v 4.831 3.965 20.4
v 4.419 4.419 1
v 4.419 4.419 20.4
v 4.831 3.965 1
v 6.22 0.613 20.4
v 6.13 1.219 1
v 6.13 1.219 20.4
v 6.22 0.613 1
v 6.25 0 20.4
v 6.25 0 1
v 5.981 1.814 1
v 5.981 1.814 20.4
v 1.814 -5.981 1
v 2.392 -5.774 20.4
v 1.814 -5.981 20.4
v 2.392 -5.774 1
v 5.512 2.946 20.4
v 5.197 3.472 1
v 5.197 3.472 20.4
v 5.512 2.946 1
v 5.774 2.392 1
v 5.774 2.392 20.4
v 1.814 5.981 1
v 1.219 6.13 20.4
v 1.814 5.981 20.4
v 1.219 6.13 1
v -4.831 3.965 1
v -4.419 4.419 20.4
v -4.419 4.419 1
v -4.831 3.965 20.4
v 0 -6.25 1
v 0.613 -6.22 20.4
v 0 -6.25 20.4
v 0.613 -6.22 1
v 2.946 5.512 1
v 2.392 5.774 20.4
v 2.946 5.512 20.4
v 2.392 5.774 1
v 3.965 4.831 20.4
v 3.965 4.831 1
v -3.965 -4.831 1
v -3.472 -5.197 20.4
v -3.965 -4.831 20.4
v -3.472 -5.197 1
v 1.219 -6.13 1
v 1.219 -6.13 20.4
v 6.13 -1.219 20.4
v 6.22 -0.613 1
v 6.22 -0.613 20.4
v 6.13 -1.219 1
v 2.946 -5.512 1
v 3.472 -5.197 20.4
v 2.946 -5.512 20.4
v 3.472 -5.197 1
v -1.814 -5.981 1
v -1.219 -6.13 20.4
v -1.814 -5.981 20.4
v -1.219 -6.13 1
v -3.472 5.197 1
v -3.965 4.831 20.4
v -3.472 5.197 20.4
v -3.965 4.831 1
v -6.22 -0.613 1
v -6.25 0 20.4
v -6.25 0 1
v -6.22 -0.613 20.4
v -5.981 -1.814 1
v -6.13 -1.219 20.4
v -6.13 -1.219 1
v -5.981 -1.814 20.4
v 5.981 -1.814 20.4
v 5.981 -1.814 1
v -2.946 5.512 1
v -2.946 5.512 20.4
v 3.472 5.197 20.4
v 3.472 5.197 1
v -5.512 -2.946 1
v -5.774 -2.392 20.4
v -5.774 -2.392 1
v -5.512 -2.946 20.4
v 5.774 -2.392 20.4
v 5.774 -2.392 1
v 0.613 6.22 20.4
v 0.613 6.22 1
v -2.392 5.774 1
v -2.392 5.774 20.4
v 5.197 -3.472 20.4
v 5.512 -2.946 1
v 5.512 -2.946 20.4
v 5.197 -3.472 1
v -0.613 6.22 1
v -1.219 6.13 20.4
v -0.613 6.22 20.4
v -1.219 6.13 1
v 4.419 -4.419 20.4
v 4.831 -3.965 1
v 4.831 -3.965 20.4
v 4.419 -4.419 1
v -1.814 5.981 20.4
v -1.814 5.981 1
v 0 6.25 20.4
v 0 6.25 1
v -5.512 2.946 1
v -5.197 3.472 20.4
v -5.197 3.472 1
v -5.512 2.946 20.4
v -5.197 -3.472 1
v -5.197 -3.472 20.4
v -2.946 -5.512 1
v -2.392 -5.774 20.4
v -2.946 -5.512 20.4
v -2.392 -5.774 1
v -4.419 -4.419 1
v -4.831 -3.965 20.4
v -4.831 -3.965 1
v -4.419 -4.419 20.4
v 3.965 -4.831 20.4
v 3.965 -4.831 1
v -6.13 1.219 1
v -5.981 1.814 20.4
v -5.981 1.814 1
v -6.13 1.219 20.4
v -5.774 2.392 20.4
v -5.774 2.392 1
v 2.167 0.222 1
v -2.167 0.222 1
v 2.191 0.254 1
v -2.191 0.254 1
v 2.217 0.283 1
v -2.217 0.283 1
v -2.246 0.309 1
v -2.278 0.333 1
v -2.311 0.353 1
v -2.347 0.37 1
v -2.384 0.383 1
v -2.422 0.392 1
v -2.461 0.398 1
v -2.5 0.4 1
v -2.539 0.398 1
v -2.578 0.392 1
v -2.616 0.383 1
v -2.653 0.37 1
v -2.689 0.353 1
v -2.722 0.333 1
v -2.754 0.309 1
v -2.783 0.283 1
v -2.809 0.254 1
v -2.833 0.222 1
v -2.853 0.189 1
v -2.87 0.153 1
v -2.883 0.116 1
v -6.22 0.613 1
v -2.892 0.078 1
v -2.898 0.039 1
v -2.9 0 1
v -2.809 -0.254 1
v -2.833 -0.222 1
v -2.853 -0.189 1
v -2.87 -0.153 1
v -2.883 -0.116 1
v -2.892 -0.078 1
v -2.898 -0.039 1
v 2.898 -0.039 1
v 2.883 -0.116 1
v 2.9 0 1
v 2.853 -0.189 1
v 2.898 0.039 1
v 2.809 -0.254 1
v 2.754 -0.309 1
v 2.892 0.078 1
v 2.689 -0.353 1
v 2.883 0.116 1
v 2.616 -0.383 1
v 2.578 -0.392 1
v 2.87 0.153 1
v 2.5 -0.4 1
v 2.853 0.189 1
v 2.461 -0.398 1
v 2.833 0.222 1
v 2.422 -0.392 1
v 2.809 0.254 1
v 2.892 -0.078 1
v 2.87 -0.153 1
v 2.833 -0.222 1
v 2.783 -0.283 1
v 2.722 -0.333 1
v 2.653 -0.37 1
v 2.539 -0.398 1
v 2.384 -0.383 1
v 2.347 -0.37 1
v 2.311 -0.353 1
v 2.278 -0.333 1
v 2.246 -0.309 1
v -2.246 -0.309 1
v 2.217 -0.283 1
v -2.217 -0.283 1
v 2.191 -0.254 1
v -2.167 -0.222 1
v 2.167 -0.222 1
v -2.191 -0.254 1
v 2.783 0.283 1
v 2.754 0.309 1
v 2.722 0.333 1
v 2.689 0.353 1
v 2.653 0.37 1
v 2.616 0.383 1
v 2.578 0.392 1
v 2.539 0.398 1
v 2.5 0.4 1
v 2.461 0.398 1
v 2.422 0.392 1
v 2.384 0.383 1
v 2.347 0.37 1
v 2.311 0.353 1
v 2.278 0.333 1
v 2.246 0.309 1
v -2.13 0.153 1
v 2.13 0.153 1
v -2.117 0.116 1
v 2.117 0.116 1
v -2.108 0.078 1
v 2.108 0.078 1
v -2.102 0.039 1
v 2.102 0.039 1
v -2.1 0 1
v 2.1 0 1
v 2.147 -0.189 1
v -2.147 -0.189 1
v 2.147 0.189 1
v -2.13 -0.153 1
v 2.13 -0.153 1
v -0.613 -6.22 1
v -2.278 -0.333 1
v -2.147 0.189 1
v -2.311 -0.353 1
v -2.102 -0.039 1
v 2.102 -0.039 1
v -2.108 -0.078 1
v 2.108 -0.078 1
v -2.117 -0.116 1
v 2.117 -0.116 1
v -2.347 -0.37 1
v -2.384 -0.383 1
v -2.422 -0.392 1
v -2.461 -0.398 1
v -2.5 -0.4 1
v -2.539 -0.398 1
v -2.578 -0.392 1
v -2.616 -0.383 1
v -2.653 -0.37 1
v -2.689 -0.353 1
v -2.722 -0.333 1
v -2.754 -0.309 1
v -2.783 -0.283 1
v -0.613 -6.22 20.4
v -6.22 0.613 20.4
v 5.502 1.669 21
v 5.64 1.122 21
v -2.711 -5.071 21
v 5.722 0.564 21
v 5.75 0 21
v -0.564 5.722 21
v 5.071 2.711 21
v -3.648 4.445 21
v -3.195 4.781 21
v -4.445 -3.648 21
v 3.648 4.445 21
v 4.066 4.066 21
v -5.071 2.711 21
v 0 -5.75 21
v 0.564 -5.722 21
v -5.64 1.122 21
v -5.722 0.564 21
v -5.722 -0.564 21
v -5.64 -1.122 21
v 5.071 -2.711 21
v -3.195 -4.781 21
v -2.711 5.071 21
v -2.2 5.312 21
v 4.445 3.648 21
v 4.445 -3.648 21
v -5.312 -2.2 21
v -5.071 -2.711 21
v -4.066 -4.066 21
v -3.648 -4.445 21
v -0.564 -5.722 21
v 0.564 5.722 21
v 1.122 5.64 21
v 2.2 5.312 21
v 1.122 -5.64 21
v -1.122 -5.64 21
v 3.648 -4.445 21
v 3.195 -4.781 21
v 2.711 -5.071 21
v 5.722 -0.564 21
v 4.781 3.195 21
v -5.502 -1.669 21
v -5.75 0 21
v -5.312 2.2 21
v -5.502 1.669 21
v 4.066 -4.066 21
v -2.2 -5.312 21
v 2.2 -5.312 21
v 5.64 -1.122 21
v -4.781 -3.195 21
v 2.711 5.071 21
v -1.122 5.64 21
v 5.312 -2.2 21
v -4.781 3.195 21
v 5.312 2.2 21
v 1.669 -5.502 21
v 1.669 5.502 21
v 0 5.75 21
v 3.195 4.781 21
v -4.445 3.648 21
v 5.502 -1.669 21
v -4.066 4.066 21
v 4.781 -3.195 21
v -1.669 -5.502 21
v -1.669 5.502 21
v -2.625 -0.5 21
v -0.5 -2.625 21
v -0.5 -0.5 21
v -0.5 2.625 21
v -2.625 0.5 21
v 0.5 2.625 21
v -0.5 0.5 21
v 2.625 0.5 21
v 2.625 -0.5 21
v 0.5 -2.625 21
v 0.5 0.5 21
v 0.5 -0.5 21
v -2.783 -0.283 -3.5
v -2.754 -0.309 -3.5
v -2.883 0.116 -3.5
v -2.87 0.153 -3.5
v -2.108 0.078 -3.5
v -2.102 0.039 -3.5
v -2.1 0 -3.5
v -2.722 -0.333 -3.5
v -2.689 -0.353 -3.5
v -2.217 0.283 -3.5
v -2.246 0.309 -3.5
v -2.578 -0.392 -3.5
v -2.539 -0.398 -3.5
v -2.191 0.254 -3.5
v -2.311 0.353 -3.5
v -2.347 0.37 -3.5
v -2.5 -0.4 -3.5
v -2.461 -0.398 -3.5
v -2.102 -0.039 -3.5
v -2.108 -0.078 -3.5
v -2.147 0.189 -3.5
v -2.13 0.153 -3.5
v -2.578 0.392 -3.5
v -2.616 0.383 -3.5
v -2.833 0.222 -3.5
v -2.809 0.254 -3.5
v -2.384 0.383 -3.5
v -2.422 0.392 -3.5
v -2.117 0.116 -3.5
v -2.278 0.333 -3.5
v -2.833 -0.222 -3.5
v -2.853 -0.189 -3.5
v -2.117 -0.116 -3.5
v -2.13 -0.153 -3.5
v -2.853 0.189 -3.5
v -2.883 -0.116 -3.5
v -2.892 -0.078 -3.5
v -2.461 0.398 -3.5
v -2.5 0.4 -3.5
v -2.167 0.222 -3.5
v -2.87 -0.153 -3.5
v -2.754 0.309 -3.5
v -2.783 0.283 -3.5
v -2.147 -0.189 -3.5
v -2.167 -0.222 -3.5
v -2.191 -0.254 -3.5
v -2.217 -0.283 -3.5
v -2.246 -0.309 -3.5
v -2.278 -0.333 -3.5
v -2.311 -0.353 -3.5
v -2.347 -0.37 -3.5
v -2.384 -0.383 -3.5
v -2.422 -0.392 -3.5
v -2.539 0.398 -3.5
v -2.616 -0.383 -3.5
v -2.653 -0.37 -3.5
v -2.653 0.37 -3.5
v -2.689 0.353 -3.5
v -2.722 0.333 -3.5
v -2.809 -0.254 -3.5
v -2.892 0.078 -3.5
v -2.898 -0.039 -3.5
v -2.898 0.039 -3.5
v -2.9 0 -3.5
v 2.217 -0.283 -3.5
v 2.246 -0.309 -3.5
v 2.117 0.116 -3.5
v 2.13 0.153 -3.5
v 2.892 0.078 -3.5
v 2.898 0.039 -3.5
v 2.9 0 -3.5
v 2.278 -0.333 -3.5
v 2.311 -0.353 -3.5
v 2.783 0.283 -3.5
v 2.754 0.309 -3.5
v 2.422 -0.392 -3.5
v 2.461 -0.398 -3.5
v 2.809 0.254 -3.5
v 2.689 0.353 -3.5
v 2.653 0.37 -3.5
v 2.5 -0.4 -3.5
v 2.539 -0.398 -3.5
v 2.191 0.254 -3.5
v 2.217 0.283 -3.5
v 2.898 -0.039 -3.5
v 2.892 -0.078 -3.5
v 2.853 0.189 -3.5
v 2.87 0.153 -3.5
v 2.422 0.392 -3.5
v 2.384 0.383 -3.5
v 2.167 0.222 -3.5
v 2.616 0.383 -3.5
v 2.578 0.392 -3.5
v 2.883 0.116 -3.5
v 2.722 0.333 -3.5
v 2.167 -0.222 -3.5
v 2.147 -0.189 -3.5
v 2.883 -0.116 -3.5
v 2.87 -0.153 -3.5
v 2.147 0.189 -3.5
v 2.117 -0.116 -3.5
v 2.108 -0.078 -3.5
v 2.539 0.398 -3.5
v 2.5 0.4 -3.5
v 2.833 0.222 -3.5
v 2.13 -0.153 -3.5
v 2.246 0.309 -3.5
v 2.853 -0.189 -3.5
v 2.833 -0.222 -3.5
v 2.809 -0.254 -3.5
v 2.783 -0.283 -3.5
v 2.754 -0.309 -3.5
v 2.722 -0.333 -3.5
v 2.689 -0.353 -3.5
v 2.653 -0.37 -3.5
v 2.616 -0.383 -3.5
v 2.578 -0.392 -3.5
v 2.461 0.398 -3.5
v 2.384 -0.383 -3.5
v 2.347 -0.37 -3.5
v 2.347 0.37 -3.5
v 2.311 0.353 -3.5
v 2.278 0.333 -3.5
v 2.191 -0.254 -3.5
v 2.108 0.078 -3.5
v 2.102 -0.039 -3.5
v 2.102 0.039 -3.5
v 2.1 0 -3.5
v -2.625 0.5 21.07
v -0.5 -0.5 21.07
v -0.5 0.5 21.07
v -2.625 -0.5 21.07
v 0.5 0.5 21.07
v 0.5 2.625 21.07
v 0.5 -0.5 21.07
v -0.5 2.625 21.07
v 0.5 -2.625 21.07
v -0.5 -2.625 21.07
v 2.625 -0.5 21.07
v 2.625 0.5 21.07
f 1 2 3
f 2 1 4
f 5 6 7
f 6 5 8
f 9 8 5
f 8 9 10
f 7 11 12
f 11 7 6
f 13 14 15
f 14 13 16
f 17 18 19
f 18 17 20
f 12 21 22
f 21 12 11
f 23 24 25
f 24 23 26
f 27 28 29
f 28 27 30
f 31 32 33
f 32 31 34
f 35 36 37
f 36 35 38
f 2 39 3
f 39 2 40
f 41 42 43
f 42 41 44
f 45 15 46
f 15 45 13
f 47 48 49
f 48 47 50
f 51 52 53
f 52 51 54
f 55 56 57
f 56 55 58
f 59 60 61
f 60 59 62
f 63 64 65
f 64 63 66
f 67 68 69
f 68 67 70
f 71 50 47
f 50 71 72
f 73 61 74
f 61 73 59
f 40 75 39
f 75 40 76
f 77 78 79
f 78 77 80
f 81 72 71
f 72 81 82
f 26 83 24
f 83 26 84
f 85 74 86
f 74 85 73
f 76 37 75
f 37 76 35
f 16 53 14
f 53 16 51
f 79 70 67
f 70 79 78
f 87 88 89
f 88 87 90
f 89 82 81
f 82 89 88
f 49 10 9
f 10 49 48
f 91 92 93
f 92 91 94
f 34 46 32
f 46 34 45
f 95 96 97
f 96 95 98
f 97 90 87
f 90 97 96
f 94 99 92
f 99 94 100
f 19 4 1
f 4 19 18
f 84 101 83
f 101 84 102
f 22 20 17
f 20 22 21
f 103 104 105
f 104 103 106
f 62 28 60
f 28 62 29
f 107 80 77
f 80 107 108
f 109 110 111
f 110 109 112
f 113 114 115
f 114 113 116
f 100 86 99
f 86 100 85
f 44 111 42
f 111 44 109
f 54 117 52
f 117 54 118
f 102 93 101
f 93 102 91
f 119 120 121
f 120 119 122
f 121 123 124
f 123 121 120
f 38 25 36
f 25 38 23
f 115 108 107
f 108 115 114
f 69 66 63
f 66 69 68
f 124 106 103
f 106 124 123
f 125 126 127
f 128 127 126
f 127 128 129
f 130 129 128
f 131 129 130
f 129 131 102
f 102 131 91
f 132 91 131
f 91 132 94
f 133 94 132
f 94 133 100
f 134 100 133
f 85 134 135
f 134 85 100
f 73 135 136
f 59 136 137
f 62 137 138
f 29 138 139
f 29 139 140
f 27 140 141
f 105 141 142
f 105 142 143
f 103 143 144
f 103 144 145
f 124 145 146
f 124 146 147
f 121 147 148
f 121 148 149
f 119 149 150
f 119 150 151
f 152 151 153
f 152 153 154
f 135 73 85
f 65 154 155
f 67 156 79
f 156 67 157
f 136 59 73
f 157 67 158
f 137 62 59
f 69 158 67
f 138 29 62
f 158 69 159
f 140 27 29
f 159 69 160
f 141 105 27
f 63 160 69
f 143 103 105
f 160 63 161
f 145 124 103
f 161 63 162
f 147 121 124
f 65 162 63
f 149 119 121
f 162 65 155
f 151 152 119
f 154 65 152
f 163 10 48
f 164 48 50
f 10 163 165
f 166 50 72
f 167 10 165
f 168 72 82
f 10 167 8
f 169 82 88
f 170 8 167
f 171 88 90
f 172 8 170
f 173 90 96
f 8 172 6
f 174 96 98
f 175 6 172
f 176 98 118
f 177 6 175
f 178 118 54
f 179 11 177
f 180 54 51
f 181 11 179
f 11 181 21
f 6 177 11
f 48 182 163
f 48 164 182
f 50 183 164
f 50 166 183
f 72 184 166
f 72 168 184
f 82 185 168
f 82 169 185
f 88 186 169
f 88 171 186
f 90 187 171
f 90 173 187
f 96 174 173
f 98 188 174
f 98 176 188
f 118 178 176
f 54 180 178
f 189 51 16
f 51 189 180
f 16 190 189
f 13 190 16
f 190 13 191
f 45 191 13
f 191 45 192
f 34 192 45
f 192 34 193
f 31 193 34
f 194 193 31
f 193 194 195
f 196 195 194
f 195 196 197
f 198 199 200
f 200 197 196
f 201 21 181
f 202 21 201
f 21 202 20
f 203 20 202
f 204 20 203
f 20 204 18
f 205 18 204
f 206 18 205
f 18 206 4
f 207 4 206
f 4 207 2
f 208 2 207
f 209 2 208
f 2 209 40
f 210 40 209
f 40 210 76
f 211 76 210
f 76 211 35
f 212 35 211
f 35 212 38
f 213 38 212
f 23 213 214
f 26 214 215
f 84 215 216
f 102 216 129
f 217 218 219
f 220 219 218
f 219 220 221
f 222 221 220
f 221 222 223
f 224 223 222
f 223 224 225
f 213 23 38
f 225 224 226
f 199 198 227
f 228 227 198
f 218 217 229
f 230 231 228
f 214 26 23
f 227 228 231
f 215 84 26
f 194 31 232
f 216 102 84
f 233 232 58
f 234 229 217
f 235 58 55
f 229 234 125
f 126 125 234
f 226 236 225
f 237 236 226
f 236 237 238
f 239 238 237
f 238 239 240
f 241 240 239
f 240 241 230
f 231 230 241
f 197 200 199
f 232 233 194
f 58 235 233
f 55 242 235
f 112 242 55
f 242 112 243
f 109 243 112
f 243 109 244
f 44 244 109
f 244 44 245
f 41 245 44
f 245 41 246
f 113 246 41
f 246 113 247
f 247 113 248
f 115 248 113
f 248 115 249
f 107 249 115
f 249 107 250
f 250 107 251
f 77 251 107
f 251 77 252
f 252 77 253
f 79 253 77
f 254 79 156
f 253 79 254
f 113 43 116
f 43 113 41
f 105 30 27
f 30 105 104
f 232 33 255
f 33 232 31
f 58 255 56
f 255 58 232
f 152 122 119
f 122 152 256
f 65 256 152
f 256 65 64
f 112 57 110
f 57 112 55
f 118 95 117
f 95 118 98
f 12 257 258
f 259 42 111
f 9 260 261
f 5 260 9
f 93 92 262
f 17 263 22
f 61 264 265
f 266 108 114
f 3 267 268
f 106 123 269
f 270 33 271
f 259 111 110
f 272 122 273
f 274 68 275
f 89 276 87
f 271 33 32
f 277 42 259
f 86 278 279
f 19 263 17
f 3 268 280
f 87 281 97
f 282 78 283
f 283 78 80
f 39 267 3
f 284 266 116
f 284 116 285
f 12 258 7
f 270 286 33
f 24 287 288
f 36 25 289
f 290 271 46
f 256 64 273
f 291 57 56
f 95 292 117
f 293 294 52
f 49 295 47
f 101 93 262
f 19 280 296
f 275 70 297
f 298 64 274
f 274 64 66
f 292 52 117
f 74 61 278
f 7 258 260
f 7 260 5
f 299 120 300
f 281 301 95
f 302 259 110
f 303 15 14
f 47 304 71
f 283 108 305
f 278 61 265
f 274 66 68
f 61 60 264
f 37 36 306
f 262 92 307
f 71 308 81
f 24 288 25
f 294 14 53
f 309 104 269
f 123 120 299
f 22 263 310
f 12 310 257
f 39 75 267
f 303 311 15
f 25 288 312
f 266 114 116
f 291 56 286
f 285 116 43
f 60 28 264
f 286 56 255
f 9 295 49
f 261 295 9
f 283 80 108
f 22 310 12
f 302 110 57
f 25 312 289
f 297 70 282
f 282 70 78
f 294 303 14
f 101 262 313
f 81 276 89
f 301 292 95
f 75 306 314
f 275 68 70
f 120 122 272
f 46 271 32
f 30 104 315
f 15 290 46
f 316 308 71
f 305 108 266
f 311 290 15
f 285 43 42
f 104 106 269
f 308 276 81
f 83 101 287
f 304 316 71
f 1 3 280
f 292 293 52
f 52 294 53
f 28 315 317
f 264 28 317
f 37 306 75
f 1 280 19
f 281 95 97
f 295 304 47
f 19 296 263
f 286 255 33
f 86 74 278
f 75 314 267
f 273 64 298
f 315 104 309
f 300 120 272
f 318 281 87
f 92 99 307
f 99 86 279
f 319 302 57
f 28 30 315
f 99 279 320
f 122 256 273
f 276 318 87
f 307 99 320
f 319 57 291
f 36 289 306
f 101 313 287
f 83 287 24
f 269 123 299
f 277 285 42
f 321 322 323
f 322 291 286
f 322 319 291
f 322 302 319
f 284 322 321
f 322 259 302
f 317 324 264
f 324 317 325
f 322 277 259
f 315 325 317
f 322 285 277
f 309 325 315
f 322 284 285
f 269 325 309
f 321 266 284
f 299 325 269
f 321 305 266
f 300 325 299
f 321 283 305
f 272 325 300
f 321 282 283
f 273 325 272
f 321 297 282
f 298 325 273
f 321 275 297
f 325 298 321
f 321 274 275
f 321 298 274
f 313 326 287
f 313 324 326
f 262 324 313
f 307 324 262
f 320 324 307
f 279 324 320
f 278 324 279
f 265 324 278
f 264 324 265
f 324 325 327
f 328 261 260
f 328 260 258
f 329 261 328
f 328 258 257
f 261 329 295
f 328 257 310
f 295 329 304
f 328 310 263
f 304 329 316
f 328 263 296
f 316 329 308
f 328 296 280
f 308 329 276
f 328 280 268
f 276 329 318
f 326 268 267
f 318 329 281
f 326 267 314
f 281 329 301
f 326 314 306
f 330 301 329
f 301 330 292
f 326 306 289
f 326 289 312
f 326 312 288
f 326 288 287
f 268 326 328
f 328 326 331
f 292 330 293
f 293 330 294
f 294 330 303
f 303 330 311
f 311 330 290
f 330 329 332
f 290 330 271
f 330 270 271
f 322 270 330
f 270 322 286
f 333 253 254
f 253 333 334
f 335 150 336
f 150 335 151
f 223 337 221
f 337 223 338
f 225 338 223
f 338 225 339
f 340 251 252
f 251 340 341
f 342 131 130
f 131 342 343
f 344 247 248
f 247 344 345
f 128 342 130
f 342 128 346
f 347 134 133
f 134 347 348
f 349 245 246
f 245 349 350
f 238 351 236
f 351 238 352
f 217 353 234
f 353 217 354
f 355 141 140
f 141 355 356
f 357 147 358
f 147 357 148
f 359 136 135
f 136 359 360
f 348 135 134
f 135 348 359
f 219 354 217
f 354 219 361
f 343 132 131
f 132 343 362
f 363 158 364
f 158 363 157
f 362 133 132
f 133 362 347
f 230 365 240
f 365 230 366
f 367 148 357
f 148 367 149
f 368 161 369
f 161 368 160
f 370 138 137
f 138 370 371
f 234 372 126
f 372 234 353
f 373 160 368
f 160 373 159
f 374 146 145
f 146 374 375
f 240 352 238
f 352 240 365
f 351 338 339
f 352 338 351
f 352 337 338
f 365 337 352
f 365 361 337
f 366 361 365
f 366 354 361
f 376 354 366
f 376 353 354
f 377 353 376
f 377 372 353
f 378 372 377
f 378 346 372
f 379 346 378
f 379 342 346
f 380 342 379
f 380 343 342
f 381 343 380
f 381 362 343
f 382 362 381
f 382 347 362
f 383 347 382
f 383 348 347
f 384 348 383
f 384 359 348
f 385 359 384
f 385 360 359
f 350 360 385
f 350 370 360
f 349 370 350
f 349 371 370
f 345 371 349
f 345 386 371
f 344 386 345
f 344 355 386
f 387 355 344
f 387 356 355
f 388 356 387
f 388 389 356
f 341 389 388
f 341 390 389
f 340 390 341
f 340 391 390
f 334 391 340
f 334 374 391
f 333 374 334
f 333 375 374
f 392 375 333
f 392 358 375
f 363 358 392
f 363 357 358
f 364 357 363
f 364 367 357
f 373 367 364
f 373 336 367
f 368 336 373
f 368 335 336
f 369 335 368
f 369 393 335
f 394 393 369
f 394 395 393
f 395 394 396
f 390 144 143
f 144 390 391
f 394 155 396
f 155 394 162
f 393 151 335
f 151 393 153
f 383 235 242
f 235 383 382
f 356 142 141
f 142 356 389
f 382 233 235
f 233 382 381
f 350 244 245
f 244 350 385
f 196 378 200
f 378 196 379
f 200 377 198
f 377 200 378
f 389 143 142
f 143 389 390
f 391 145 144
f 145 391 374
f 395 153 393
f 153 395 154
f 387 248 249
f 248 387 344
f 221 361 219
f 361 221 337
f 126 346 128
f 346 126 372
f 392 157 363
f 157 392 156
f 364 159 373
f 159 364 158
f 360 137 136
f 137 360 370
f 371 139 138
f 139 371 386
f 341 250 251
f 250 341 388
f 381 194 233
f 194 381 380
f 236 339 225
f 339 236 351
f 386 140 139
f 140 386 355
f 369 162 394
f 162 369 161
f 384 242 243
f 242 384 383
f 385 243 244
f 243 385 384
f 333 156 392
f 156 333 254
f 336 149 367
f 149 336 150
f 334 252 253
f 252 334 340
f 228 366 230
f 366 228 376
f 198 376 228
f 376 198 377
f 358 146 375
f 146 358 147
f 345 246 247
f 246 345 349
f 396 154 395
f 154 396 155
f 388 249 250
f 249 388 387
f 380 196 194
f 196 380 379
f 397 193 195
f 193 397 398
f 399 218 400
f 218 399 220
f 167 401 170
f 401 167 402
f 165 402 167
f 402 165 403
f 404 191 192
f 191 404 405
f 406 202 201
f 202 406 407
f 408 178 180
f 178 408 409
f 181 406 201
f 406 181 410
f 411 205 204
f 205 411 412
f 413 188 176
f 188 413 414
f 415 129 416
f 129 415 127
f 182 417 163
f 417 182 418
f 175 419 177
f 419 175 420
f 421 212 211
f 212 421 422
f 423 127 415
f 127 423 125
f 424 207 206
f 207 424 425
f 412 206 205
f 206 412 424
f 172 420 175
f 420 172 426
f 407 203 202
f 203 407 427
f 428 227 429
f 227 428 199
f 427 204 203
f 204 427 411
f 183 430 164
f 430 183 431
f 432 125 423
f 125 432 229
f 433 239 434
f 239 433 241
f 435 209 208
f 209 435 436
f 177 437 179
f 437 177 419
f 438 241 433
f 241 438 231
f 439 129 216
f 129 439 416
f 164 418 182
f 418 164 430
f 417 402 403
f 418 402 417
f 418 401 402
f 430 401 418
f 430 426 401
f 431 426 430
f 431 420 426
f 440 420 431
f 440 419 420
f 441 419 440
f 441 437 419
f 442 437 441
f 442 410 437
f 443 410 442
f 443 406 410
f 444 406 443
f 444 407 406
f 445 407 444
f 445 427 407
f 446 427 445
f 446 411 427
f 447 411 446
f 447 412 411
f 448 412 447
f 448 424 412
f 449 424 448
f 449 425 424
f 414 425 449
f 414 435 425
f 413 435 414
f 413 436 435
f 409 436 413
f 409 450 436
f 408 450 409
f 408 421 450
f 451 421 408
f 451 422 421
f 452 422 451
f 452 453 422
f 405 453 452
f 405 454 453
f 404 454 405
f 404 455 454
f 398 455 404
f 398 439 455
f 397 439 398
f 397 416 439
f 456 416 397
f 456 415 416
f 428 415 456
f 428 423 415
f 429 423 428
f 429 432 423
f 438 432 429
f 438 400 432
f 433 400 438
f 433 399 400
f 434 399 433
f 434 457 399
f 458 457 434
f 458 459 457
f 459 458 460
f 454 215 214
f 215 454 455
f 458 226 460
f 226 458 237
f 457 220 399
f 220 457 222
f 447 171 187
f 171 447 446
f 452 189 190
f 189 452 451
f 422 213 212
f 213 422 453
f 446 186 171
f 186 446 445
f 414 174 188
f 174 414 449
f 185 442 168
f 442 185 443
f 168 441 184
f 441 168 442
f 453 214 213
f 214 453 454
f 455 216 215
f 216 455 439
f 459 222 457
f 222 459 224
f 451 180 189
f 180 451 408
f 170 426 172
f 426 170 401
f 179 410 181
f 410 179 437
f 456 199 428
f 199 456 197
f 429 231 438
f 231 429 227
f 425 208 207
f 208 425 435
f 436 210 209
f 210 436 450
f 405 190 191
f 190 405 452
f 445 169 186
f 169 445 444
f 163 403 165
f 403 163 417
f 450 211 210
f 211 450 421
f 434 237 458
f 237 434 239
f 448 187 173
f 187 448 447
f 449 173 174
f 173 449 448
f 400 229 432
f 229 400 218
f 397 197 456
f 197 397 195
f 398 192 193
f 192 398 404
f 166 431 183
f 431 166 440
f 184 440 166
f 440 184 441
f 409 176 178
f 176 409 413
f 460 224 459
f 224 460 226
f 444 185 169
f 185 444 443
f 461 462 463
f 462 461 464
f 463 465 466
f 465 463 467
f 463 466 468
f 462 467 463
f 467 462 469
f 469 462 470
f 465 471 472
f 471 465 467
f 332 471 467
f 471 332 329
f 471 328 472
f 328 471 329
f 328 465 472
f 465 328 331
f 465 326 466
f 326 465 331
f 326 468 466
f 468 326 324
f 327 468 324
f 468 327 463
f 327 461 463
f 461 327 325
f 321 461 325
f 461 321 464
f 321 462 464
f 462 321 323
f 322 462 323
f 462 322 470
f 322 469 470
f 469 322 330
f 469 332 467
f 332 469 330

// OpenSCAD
$fn = 64;

body_diameter = 12.5;
body_height = 20;
lead_spacing = 5;
lead_diameter = 0.8;
lead_length_below = 3.5;
body_lift = 1;
lead_stub = 1;
top_chamfer = 0.6;

module lead(x) {
    color([0.75, 0.75, 0.75])
    translate([x, 0, -lead_length_below])
        cylinder(h = lead_length_below + body_lift + lead_stub, d = lead_diameter);
}

module capacitor_body() {
    color([0.16, 0.18, 0.19])
    union() {
        translate([0, 0, body_lift])
            cylinder(h = body_height - top_chamfer, d = body_diameter);
        translate([0, 0, body_lift + body_height - top_chamfer])
            cylinder(h = top_chamfer, d1 = body_diameter, d2 = body_diameter * 0.92);
    }
}

module top_vent() {
    color([0.78, 0.78, 0.78])
    translate([0, 0, body_lift + body_height - 0.05])
    linear_extrude(height = 0.12)
    union() {
        square([body_diameter * 0.42, body_diameter * 0.08], center = true);
        square([body_diameter * 0.08, body_diameter * 0.42], center = true);
    }
}

lead(-lead_spacing / 2);
lead( lead_spacing / 2);
capacitor_body();
top_vent();
